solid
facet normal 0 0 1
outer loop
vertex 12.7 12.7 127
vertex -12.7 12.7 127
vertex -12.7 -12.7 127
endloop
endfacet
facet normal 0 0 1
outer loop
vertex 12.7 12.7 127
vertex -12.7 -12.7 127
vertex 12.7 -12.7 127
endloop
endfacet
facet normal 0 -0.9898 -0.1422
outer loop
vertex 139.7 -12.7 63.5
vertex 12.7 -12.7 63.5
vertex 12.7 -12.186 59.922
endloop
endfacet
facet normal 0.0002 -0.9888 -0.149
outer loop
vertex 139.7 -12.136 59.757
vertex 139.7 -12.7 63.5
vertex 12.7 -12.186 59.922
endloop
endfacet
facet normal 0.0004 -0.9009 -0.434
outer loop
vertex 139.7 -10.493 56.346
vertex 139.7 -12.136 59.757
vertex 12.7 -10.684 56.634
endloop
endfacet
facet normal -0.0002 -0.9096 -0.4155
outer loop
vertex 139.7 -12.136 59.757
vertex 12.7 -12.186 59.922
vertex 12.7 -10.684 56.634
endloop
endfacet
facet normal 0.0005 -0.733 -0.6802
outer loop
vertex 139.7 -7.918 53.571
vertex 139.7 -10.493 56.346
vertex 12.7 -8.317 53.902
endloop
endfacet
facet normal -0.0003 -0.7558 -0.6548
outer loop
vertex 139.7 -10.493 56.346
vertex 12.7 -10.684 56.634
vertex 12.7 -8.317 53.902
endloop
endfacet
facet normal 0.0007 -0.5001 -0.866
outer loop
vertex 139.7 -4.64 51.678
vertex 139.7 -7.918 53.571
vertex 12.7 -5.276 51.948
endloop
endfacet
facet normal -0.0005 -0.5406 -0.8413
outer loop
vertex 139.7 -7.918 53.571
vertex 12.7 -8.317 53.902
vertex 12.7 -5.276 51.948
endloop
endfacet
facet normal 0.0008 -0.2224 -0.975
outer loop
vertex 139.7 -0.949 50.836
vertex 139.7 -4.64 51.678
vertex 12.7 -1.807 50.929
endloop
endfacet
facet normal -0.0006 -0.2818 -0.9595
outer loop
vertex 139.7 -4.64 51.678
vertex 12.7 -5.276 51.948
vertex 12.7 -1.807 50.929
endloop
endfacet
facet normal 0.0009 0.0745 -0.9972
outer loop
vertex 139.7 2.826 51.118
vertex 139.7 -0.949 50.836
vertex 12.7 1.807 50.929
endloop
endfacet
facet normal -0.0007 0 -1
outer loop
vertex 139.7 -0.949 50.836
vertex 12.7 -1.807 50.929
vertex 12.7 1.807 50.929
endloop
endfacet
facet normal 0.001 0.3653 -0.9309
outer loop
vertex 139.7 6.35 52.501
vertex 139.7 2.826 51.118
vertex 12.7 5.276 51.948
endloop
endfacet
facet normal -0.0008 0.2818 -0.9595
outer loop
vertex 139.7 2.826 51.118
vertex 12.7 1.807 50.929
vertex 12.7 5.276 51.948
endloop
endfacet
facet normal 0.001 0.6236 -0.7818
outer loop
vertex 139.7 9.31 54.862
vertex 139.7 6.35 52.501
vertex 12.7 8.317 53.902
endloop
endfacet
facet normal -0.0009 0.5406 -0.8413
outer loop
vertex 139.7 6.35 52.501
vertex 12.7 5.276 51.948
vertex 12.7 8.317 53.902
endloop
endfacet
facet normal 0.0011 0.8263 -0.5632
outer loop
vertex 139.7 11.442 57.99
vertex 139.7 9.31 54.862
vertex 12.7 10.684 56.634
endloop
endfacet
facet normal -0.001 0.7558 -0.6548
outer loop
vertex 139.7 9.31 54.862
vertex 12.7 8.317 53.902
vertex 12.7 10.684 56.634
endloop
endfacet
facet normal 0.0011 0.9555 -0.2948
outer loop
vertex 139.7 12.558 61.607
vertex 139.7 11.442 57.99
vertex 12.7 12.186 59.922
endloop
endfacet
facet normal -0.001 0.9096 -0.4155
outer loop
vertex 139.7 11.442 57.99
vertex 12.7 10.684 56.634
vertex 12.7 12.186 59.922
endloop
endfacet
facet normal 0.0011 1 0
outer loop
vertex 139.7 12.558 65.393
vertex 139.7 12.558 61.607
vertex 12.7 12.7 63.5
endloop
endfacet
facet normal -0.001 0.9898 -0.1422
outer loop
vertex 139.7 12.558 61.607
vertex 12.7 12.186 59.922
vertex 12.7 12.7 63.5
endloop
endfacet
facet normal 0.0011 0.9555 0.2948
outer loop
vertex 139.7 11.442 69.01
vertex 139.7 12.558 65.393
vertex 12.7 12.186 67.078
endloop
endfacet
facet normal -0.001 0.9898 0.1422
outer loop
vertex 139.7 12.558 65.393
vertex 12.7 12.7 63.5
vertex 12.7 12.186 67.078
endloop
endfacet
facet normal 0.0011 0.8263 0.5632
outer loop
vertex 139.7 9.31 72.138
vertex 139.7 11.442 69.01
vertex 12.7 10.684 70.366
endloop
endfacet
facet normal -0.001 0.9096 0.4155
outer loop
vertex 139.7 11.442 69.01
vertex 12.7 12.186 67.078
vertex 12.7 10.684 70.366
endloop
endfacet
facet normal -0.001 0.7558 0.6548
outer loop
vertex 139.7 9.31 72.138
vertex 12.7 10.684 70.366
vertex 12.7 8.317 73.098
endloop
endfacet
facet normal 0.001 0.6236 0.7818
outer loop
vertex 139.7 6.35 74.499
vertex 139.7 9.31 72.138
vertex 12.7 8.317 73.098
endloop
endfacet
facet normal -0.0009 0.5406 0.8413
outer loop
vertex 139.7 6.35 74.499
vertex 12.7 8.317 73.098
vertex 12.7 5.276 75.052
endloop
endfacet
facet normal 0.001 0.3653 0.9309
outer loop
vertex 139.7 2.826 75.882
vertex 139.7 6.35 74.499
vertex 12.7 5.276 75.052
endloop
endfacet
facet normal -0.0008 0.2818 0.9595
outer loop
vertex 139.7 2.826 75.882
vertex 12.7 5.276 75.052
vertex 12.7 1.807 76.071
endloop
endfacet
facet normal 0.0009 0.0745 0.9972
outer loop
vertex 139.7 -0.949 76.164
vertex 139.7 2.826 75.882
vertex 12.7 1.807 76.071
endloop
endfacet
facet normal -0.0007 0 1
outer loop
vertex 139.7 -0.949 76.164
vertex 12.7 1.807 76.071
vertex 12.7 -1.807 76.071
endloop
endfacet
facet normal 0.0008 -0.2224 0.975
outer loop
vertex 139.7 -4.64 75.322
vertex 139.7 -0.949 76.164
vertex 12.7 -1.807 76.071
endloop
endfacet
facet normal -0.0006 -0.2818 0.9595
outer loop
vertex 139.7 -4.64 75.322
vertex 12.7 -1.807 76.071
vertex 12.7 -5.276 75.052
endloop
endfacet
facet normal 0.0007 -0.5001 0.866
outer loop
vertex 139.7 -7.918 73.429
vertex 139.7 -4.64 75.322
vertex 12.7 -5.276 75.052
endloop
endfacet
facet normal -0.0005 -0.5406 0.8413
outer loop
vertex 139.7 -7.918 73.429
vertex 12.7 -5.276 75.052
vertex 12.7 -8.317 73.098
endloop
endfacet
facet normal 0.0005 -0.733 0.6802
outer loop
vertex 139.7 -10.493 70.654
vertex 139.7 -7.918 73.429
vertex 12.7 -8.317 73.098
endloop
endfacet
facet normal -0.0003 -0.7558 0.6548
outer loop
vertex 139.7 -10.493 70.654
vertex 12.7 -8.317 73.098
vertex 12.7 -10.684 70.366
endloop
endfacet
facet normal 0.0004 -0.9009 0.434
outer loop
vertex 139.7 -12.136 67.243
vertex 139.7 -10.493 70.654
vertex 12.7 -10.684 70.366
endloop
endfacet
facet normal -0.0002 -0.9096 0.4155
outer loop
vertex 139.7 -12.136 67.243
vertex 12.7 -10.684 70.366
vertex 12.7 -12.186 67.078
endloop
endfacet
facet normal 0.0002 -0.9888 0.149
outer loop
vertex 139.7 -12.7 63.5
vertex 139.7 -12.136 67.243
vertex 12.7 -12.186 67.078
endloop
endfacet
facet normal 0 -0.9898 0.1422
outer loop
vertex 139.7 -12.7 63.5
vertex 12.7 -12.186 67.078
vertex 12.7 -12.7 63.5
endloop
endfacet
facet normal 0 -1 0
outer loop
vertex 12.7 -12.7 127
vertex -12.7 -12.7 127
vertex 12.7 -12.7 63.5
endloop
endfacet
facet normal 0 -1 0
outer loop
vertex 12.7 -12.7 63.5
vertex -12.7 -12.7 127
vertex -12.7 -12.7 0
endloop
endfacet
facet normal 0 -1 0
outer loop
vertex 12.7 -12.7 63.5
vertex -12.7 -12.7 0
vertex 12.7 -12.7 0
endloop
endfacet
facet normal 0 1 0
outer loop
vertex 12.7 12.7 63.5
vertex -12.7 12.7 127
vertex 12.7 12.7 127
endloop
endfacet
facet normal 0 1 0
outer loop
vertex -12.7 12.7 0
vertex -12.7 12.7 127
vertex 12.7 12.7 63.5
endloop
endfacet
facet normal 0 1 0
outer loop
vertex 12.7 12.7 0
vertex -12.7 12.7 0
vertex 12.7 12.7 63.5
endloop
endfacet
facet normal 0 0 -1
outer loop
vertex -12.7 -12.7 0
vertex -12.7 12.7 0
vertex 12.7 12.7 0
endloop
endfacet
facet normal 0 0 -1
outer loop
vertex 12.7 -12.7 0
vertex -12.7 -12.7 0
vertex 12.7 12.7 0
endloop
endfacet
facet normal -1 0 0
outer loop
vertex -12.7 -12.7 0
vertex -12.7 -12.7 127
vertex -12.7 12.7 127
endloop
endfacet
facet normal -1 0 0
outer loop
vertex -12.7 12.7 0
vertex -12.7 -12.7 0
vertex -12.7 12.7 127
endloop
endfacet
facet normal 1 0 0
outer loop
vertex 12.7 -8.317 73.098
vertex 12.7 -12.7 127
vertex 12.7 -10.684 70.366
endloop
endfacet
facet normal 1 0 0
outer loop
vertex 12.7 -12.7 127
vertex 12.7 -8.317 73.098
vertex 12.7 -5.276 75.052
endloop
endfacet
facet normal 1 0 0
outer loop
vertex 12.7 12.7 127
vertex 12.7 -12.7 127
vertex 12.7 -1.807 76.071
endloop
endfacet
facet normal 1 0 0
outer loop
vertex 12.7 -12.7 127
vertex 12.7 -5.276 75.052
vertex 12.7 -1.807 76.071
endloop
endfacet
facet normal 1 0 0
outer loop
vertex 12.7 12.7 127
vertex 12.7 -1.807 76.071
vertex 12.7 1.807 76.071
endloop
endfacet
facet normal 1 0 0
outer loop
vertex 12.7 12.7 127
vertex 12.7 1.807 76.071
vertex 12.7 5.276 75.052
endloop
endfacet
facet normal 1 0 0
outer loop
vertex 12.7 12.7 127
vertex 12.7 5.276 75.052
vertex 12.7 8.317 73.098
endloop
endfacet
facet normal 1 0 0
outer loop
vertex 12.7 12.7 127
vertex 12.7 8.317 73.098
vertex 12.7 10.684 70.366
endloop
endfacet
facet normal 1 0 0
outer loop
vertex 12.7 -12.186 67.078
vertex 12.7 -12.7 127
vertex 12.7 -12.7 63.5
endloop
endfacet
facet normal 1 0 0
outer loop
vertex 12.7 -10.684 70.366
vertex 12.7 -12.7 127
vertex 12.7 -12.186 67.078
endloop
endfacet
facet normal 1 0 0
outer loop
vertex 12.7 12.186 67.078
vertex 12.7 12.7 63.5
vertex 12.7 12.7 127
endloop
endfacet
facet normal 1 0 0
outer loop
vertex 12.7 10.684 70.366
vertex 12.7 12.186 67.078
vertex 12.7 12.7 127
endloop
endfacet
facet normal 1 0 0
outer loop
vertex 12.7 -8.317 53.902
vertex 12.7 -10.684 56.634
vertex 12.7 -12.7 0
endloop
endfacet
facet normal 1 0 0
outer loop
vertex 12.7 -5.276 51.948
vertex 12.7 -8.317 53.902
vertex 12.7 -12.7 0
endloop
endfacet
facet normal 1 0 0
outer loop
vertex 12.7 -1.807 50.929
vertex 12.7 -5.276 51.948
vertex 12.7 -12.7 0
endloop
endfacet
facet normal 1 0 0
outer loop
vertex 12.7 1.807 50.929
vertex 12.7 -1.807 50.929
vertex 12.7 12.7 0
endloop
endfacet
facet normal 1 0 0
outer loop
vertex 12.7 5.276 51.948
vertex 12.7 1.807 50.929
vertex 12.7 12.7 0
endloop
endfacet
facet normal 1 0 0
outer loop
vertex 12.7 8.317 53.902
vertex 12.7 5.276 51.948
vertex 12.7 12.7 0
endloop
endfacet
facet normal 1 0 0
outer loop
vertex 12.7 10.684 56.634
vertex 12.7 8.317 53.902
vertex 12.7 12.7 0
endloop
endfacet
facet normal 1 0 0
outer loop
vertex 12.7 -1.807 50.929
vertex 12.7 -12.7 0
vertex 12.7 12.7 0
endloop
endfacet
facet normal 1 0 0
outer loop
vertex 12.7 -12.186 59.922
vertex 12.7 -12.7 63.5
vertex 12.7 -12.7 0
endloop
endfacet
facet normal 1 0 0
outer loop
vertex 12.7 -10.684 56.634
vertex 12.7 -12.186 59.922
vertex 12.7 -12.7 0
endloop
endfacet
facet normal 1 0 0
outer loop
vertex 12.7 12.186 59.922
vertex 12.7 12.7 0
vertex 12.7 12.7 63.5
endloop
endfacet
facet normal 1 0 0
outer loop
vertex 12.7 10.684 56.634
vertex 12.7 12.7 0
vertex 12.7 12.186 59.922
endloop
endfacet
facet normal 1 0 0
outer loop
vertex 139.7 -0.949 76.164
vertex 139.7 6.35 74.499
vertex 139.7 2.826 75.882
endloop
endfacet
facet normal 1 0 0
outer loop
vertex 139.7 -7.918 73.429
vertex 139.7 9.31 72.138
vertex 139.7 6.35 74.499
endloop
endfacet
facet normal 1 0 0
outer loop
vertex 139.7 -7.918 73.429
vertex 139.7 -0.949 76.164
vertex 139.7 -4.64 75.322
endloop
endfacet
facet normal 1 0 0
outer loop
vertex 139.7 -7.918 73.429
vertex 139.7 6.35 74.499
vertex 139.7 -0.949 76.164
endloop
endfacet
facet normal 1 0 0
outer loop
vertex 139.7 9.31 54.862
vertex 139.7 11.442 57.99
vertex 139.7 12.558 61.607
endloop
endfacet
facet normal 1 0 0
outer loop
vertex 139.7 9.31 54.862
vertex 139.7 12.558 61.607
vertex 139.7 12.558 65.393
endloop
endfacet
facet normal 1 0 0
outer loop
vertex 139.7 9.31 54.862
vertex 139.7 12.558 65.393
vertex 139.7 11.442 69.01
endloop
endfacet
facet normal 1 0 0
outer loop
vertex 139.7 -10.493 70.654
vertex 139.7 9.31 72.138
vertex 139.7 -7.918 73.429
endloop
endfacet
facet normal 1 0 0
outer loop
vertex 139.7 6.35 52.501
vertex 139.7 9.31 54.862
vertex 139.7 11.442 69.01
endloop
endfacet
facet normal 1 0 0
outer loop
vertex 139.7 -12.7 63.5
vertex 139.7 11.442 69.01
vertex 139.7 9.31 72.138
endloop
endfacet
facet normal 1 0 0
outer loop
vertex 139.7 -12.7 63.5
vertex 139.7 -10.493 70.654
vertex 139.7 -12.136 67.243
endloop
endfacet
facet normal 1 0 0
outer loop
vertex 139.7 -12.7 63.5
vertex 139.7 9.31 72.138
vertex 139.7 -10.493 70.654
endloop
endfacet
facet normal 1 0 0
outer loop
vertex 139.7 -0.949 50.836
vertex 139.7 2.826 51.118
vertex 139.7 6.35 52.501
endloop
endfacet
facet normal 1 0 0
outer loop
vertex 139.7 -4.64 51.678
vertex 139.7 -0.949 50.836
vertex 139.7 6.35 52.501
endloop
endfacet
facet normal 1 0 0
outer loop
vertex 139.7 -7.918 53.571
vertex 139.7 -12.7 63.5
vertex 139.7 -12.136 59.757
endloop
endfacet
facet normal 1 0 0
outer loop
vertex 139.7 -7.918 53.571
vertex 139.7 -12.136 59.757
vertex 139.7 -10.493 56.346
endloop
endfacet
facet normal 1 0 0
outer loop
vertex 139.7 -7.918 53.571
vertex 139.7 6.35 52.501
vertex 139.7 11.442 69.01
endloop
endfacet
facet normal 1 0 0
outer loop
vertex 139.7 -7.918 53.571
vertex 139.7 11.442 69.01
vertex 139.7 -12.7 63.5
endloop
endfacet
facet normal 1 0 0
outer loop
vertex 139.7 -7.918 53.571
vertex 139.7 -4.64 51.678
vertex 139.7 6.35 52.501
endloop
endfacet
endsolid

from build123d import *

# Parameters (mm, degrees)
SKETCH1_W           = 25.4
SKETCH1_H           = 25.4
BOSS_EXTRUDE1_DEPTH = 127
SKETCH2_R           = 12.7
BOSS_EXTRUDE2_DEPTH = 127


with BuildPart() as part:
    # Sketch1 → Boss-Extrude1 (new body)
    with BuildSketch(Plane.XY):
        Rectangle(SKETCH1_W, SKETCH1_H)
    extrude(amount=BOSS_EXTRUDE1_DEPTH)

    # Sketch2 → Boss-Extrude2 (add)
    with BuildSketch(Plane(origin=(12.7, 0, 0), x_dir=(0, 0, -1), z_dir=(1, 0, 0))):
        with Locations(Location((-63.5, 0, 0), (0, 0, 270))):
            Circle(SKETCH2_R)
    extrude(amount=BOSS_EXTRUDE2_DEPTH)


solid = part.part
